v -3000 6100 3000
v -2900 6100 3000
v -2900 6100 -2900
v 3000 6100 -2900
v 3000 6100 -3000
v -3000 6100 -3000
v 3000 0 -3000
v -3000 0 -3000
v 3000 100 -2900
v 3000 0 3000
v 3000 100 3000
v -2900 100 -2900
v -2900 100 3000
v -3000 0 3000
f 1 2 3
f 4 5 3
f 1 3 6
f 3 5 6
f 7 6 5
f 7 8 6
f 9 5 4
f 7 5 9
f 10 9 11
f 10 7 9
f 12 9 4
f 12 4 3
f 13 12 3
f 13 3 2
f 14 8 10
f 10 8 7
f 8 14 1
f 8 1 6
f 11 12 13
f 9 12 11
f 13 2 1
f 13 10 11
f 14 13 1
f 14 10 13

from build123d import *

# Parameters (mm, degrees)
SKETCH1_W           = 6000
SKETCH1_H           = 6000
BOSS_EXTRUDE2_DEPTH = 100
BOSS_EXTRUDE3_DEPTH = 6000


with BuildPart() as part:
    # Sketch1 → Boss-Extrude2 (new body)
    with BuildSketch(Plane(origin=(0, 0, 0), x_dir=(1, 0, 0), z_dir=(0, 1, 0))):
        Rectangle(SKETCH1_W, SKETCH1_H)
    extrude(amount=BOSS_EXTRUDE2_DEPTH)

    # Sketch2 → Boss-Extrude3 (add)
    with BuildSketch(Plane(origin=(0, 100, 0), x_dir=(1, 0, 0), z_dir=(0, 1, 0))):
        Polygon((3000, 2900), (-2900, 2900), (-2900, -3000), (-3000, -3000), (-3000, 3000), (3000, 3000), align=None)
    extrude(amount=BOSS_EXTRUDE3_DEPTH)


solid = part.part
